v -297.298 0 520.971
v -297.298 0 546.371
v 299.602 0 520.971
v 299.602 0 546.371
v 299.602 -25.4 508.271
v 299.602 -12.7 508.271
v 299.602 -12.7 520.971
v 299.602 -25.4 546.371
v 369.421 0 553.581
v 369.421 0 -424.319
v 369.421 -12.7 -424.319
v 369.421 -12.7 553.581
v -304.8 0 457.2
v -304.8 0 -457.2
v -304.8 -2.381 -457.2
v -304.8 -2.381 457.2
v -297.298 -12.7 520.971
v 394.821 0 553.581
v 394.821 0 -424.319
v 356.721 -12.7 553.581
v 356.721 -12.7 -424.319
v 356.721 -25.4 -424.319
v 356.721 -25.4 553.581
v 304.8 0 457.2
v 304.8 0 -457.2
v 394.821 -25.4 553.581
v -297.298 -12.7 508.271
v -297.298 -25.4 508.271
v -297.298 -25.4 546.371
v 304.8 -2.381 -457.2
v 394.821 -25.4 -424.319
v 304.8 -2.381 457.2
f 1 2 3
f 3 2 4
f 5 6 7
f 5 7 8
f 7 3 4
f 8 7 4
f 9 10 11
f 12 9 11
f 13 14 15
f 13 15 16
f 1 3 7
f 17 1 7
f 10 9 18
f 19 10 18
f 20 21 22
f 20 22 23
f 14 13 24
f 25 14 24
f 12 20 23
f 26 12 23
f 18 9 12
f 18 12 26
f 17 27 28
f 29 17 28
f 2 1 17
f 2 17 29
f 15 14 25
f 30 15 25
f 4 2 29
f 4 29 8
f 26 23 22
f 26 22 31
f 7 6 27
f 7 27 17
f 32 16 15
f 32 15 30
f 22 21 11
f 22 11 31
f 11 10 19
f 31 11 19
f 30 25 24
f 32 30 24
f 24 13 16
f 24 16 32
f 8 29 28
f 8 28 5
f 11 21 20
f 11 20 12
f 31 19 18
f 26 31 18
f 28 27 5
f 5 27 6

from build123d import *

# Parameters (mm, degrees)
F0_W     = 609.6
F0_H     = 914.4
F1_DEPTH = 2.38125
F3_W     = 38.1
F3_H     = 977.9
F4_DEPTH = 25.4
F2_W     = 596.9
F2_H     = 38.1
F5_DEPTH = 25.4
F6_W     = 12.7
F6_H     = 12.7
F7_DEPTH = 609.6
F8_W     = 12.7
F8_H     = 12.7
F9_DEPTH = 977.901


with BuildPart() as f1:
    # F0 (on Front) → F1 (new body)
    with BuildSketch(Plane.XZ):
        Rectangle(F0_W, F0_H)
    extrude(amount=F1_DEPTH)


with BuildPart() as f4:
    # F3 (on Front) → F4 (new body)
    with BuildSketch(Plane.XZ):
        with Locations((375.770703, 64.631486)):
            Rectangle(F3_W, F3_H)
    extrude(amount=F4_DEPTH)

    # F8 (on face) → F9 (cut, through all)
    with BuildSketch(Plane(origin=(0, 0, -424.318514), x_dir=(1, 0, 0), z_dir=(0, 0, -1))):
        with Locations((363.070703, 6.35)):
            Rectangle(F8_W, F8_H)
    extrude(amount=-F9_DEPTH, mode=Mode.SUBTRACT)


with BuildPart() as f5:
    # F2 (on Front) → F5 (new body)
    with BuildSketch(Plane.XZ):
        with Locations((1.151833, 527.320564)):
            Rectangle(F2_W, F2_H)
    extrude(amount=F5_DEPTH)

    # F6 (on face) → F7 (cut)
    with BuildSketch(Plane(origin=(-297.298167, 0, 0), x_dir=(0, -1, 0), z_dir=(-1, 0, 0))):
        with Locations((6.35, 514.620564)):
            Rectangle(F6_W, F6_H)
    extrude(amount=-F7_DEPTH, mode=Mode.SUBTRACT)


solid = Compound([f1.part, f4.part, f5.part])
